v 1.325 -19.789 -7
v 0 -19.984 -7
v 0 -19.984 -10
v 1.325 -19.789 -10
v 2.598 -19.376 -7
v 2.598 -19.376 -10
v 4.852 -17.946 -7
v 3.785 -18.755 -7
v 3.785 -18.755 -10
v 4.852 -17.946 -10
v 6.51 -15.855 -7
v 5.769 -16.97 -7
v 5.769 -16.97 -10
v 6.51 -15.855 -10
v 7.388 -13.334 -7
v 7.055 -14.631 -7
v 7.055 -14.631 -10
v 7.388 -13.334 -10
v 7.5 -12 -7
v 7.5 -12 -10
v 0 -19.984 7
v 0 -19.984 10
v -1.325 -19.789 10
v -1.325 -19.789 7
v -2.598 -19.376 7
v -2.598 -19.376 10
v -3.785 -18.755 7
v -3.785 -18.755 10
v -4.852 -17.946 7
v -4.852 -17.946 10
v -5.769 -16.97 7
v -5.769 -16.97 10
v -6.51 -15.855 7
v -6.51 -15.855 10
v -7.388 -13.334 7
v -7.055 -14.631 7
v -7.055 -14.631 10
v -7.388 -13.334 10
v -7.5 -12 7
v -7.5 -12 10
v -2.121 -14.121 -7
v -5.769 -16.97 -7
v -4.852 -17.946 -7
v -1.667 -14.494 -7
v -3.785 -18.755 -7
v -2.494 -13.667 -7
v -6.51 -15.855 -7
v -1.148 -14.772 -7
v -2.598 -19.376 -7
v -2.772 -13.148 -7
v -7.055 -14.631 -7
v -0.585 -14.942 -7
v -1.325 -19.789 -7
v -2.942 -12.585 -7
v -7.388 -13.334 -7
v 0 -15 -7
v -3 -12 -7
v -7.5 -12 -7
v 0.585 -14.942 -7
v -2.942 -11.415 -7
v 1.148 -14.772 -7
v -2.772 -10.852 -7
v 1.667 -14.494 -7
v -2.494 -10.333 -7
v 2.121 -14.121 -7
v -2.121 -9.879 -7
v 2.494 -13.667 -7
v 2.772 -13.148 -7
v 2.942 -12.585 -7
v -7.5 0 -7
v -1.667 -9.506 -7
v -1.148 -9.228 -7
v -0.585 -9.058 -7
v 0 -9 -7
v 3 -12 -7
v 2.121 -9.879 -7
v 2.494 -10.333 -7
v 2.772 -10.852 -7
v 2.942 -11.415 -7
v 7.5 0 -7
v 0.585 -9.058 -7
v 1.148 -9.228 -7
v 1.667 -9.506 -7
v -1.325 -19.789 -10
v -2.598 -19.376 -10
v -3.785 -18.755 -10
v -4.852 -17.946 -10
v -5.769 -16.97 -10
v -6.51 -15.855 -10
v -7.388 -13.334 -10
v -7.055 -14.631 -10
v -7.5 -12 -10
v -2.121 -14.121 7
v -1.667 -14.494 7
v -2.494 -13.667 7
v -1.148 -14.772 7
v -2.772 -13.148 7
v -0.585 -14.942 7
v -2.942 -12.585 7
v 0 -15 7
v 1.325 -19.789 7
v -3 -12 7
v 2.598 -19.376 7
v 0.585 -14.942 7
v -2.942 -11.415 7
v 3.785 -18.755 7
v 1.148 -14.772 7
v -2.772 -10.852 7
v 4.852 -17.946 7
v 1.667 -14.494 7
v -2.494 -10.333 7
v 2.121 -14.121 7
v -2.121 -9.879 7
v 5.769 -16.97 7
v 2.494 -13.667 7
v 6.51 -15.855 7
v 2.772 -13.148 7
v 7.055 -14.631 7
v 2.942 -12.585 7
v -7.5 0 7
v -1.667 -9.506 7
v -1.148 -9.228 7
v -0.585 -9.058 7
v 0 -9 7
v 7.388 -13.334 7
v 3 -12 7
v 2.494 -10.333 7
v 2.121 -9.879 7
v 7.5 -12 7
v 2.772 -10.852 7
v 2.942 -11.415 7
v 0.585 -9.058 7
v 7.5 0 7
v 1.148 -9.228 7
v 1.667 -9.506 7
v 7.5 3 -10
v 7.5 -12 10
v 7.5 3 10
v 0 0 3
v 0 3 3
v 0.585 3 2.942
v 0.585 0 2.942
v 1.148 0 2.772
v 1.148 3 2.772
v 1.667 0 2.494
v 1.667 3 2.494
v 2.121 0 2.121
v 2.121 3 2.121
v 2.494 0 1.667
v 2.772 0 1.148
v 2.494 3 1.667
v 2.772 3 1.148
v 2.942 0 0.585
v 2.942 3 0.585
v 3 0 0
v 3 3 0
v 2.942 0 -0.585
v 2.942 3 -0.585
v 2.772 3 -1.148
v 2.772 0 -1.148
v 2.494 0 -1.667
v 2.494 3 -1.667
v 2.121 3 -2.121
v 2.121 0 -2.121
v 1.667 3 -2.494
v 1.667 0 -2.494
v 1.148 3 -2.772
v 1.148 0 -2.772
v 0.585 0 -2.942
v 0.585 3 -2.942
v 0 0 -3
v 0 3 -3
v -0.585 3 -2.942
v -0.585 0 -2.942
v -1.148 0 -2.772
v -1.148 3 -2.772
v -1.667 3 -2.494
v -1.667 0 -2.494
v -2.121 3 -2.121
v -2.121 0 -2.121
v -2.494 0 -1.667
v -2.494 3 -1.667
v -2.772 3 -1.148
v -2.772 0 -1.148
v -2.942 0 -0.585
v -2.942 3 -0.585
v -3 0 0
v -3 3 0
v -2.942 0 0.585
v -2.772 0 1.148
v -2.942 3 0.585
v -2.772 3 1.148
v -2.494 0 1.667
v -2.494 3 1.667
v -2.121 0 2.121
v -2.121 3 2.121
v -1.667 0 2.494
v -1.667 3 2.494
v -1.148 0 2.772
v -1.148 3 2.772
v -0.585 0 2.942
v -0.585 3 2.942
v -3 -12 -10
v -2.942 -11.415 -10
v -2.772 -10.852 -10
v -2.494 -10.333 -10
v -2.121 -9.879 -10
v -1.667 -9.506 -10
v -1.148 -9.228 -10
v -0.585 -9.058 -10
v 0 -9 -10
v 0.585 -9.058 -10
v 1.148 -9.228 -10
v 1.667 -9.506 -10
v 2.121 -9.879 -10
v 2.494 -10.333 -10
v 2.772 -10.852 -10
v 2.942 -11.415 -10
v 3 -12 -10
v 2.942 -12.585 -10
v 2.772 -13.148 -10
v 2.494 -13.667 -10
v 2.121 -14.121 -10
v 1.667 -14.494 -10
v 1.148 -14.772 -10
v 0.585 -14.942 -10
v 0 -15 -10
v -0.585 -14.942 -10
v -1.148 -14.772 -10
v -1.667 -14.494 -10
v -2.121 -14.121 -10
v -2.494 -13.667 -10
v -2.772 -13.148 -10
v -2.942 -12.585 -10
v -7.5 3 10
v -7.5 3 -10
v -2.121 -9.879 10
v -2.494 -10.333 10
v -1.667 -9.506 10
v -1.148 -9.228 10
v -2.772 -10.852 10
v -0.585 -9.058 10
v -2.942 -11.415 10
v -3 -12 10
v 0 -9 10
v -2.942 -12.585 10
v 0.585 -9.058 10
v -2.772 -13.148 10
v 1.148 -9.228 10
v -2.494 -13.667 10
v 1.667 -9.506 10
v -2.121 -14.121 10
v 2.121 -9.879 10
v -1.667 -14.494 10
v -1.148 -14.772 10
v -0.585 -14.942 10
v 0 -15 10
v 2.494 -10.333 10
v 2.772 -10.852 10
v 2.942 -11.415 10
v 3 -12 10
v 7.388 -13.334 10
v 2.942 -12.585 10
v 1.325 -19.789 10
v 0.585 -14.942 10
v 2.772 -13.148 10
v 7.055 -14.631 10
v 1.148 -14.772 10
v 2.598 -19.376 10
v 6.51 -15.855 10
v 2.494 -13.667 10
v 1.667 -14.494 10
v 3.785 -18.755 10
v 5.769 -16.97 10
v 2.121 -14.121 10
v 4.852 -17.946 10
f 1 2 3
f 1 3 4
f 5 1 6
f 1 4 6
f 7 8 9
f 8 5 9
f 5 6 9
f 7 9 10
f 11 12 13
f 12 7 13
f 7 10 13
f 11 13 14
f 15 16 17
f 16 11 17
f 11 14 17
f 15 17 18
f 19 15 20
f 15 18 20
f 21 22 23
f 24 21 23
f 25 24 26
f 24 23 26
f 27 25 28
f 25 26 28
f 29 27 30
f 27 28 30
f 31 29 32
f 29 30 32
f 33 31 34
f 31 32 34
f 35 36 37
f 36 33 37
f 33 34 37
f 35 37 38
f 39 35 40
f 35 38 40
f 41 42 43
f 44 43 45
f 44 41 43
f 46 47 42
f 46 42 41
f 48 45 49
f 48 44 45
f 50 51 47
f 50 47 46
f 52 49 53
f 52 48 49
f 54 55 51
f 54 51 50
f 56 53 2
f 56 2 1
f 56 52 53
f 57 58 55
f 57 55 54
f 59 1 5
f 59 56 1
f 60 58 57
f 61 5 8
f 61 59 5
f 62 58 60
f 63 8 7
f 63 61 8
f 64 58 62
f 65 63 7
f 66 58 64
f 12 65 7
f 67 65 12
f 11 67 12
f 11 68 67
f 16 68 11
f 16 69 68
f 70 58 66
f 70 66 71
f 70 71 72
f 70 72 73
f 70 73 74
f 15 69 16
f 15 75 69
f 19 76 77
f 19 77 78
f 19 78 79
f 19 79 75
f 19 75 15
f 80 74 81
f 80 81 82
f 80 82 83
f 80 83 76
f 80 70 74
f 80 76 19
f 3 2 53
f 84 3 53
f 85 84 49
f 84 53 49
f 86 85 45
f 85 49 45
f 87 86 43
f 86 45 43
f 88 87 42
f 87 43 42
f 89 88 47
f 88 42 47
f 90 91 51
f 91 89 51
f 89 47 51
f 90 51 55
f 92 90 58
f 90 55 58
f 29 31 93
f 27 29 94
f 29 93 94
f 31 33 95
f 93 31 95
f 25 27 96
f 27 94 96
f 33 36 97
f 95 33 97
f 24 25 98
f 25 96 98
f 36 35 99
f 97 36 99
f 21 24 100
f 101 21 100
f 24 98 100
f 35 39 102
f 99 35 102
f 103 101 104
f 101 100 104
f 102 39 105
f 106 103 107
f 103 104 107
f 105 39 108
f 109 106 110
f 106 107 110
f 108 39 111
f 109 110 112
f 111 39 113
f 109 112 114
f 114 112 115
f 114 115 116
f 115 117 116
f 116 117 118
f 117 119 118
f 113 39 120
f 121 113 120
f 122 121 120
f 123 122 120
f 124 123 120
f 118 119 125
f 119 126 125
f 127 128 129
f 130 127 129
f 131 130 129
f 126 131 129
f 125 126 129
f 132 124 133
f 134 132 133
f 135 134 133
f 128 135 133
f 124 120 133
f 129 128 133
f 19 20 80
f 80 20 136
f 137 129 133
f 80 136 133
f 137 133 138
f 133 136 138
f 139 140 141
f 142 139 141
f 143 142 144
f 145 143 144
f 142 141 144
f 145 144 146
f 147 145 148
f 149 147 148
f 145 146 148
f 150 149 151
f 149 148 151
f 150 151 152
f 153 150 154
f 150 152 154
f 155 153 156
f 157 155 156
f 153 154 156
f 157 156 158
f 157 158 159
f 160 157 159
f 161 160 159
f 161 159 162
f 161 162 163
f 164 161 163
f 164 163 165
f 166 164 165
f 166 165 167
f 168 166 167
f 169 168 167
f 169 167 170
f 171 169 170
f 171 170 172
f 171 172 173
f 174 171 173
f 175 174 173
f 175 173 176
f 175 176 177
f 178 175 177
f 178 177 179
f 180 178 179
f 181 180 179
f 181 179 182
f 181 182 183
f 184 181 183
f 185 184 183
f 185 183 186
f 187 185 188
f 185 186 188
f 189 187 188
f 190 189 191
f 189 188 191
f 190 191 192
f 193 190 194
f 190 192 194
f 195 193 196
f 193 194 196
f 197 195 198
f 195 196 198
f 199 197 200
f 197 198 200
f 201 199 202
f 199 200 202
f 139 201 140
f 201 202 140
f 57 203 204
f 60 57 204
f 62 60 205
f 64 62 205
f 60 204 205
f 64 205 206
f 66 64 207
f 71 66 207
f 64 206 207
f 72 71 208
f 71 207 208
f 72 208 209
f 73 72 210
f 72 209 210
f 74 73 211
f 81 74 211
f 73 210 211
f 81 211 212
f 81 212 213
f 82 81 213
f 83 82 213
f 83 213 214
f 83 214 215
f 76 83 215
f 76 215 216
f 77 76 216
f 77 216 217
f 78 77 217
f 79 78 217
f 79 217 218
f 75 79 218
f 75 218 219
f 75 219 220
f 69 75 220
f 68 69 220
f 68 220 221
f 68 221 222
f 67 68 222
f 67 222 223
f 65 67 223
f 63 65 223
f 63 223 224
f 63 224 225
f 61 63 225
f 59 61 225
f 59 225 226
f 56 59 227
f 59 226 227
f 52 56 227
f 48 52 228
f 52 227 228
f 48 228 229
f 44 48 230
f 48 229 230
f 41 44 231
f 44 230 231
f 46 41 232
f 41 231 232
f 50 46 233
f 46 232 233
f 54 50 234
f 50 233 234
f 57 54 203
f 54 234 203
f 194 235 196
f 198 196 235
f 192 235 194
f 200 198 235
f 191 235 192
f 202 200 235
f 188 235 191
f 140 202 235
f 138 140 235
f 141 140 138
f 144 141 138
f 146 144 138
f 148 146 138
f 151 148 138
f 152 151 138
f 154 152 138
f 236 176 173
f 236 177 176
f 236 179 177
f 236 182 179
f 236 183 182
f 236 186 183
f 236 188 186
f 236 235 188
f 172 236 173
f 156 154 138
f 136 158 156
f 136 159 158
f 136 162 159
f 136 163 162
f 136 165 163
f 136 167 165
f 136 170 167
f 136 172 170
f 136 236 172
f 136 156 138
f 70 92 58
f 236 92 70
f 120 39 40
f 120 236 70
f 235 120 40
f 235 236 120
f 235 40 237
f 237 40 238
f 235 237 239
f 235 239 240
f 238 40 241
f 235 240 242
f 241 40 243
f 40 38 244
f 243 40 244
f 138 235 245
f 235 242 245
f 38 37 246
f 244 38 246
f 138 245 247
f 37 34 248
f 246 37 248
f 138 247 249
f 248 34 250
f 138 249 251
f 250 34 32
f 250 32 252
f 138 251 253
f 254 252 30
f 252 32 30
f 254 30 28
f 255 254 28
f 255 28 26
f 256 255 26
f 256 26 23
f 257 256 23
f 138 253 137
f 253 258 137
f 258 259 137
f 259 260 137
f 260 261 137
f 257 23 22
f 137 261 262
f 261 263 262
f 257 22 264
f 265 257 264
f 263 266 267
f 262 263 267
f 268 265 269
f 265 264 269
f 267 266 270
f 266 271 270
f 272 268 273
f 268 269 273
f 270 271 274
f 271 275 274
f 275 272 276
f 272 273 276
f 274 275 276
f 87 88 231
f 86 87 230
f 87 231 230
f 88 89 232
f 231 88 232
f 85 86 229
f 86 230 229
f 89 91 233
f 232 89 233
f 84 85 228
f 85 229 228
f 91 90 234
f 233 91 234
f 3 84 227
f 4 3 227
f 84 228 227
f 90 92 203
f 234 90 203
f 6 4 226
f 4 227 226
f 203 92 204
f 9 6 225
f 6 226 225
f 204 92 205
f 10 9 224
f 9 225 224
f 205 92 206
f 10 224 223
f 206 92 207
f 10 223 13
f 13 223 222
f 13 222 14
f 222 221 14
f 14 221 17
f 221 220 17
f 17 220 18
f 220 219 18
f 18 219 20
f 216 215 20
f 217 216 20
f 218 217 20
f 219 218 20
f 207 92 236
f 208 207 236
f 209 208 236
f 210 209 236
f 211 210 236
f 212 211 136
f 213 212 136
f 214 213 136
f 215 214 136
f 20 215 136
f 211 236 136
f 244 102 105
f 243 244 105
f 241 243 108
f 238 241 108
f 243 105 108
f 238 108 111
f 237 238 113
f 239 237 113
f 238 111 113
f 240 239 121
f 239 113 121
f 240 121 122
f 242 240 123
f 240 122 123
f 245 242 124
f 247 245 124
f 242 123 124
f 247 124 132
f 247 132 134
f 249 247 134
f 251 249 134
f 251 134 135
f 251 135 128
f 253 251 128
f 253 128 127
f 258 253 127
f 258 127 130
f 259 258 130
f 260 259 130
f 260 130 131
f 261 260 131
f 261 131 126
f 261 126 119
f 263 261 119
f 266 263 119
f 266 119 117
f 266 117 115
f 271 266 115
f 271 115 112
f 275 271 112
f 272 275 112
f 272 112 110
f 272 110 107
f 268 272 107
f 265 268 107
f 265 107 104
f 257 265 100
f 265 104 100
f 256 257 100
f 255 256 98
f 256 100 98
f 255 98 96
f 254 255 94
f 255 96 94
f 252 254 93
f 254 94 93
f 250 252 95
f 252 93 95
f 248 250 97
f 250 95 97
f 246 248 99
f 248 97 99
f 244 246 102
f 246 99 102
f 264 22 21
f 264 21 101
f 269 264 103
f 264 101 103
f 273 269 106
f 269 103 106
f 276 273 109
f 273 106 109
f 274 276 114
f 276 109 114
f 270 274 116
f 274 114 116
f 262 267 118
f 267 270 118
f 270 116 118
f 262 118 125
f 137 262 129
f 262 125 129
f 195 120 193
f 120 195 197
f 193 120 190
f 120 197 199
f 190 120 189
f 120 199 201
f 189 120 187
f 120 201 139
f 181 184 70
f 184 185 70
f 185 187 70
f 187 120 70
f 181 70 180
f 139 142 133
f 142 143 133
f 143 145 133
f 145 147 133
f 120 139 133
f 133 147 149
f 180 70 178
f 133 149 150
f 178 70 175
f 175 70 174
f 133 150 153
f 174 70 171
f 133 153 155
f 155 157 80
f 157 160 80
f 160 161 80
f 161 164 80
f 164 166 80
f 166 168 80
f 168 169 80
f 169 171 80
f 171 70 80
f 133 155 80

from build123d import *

# Parameters (mm, degrees)
SKETCH1_W           = 15
SKETCH1_H           = 20
BOSS_EXTRUDE1_DEPTH = 3
SKETCH3_W           = 15
SKETCH3_H           = 3
BOSS_EXTRUDE3_DEPTH = 20
SKETCH4_R           = 3
CUT_EXTRUDE1_DEPTH  = 30.261749777
SKETCH2_R           = 3
CUT_EXTRUDE2_DEPTH  = 15
FILLET1_R           = 8


with BuildPart() as part:
    # Sketch1 → Boss-Extrude1 (new body)
    with BuildSketch(Plane(origin=(0, 0, 0), x_dir=(1, 0, 0), z_dir=(0, 1, 0))):
        Rectangle(SKETCH1_W, SKETCH1_H)
    extrude(amount=BOSS_EXTRUDE1_DEPTH)

    # Sketch3 → Boss-Extrude3 (add)
    with BuildSketch(Plane.XZ):
        with Locations((0, -8.5)):
            Rectangle(SKETCH3_W, SKETCH3_H)
        with Locations((0, 8.5)):
            Rectangle(SKETCH3_W, SKETCH3_H)
    extrude(amount=BOSS_EXTRUDE3_DEPTH)

    # Sketch4 → Cut-Extrude1 (cut, through all)
    with BuildSketch(Plane(origin=(0, 0, -10), x_dir=(-1, 0, 0), z_dir=(0, 0, -1))):
        with Locations((0, -12)):
            Circle(SKETCH4_R)
    extrude(amount=-CUT_EXTRUDE1_DEPTH, mode=Mode.SUBTRACT)

    # Sketch2 → Cut-Extrude2 (cut)
    with BuildSketch(Plane(origin=(0, 3, 0), x_dir=(1, 0, 0), z_dir=(0, 1, 0))):
        with Locations(Location((0, 0, 0), (0, 0, 270))):
            Circle(SKETCH2_R)
    extrude(amount=-CUT_EXTRUDE2_DEPTH, mode=Mode.SUBTRACT)

    # Fillet1
    # the kernel refuses this fillet: 8 mm, written as the material it takes off along each edge
    with BuildSketch(Plane(origin=(-7.5, -20, 30), x_dir=(0, 1, 0), z_dir=(0, 0, -1)), Plane(origin=(7.5, -20, -13), x_dir=(0, 1, 0), z_dir=(0, 0, 1))) as fillet1_piece_1:
        with BuildLine():
            CenterArc((FILLET1_R, FILLET1_R), FILLET1_R, 180, 90)
            Line((0, FILLET1_R), (0, 0))
            Line((0, 0), (FILLET1_R, 0))
        make_face()
    extrude(amount=43, mode=Mode.SUBTRACT)
    with BuildSketch(Plane(origin=(7.5, -20, 13), x_dir=(0, 1, 0), z_dir=(0, 0, -1)), Plane(origin=(-7.5, -20, -30), x_dir=(0, 1, 0), z_dir=(0, 0, 1))) as fillet1_piece_2:
        with BuildLine():
            CenterArc((FILLET1_R, -FILLET1_R), FILLET1_R, 90, 90)
            Line((0, -FILLET1_R), (0, 0))
            Line((0, 0), (FILLET1_R, 0))
        make_face()
    extrude(amount=43, mode=Mode.SUBTRACT)


solid = part.part
